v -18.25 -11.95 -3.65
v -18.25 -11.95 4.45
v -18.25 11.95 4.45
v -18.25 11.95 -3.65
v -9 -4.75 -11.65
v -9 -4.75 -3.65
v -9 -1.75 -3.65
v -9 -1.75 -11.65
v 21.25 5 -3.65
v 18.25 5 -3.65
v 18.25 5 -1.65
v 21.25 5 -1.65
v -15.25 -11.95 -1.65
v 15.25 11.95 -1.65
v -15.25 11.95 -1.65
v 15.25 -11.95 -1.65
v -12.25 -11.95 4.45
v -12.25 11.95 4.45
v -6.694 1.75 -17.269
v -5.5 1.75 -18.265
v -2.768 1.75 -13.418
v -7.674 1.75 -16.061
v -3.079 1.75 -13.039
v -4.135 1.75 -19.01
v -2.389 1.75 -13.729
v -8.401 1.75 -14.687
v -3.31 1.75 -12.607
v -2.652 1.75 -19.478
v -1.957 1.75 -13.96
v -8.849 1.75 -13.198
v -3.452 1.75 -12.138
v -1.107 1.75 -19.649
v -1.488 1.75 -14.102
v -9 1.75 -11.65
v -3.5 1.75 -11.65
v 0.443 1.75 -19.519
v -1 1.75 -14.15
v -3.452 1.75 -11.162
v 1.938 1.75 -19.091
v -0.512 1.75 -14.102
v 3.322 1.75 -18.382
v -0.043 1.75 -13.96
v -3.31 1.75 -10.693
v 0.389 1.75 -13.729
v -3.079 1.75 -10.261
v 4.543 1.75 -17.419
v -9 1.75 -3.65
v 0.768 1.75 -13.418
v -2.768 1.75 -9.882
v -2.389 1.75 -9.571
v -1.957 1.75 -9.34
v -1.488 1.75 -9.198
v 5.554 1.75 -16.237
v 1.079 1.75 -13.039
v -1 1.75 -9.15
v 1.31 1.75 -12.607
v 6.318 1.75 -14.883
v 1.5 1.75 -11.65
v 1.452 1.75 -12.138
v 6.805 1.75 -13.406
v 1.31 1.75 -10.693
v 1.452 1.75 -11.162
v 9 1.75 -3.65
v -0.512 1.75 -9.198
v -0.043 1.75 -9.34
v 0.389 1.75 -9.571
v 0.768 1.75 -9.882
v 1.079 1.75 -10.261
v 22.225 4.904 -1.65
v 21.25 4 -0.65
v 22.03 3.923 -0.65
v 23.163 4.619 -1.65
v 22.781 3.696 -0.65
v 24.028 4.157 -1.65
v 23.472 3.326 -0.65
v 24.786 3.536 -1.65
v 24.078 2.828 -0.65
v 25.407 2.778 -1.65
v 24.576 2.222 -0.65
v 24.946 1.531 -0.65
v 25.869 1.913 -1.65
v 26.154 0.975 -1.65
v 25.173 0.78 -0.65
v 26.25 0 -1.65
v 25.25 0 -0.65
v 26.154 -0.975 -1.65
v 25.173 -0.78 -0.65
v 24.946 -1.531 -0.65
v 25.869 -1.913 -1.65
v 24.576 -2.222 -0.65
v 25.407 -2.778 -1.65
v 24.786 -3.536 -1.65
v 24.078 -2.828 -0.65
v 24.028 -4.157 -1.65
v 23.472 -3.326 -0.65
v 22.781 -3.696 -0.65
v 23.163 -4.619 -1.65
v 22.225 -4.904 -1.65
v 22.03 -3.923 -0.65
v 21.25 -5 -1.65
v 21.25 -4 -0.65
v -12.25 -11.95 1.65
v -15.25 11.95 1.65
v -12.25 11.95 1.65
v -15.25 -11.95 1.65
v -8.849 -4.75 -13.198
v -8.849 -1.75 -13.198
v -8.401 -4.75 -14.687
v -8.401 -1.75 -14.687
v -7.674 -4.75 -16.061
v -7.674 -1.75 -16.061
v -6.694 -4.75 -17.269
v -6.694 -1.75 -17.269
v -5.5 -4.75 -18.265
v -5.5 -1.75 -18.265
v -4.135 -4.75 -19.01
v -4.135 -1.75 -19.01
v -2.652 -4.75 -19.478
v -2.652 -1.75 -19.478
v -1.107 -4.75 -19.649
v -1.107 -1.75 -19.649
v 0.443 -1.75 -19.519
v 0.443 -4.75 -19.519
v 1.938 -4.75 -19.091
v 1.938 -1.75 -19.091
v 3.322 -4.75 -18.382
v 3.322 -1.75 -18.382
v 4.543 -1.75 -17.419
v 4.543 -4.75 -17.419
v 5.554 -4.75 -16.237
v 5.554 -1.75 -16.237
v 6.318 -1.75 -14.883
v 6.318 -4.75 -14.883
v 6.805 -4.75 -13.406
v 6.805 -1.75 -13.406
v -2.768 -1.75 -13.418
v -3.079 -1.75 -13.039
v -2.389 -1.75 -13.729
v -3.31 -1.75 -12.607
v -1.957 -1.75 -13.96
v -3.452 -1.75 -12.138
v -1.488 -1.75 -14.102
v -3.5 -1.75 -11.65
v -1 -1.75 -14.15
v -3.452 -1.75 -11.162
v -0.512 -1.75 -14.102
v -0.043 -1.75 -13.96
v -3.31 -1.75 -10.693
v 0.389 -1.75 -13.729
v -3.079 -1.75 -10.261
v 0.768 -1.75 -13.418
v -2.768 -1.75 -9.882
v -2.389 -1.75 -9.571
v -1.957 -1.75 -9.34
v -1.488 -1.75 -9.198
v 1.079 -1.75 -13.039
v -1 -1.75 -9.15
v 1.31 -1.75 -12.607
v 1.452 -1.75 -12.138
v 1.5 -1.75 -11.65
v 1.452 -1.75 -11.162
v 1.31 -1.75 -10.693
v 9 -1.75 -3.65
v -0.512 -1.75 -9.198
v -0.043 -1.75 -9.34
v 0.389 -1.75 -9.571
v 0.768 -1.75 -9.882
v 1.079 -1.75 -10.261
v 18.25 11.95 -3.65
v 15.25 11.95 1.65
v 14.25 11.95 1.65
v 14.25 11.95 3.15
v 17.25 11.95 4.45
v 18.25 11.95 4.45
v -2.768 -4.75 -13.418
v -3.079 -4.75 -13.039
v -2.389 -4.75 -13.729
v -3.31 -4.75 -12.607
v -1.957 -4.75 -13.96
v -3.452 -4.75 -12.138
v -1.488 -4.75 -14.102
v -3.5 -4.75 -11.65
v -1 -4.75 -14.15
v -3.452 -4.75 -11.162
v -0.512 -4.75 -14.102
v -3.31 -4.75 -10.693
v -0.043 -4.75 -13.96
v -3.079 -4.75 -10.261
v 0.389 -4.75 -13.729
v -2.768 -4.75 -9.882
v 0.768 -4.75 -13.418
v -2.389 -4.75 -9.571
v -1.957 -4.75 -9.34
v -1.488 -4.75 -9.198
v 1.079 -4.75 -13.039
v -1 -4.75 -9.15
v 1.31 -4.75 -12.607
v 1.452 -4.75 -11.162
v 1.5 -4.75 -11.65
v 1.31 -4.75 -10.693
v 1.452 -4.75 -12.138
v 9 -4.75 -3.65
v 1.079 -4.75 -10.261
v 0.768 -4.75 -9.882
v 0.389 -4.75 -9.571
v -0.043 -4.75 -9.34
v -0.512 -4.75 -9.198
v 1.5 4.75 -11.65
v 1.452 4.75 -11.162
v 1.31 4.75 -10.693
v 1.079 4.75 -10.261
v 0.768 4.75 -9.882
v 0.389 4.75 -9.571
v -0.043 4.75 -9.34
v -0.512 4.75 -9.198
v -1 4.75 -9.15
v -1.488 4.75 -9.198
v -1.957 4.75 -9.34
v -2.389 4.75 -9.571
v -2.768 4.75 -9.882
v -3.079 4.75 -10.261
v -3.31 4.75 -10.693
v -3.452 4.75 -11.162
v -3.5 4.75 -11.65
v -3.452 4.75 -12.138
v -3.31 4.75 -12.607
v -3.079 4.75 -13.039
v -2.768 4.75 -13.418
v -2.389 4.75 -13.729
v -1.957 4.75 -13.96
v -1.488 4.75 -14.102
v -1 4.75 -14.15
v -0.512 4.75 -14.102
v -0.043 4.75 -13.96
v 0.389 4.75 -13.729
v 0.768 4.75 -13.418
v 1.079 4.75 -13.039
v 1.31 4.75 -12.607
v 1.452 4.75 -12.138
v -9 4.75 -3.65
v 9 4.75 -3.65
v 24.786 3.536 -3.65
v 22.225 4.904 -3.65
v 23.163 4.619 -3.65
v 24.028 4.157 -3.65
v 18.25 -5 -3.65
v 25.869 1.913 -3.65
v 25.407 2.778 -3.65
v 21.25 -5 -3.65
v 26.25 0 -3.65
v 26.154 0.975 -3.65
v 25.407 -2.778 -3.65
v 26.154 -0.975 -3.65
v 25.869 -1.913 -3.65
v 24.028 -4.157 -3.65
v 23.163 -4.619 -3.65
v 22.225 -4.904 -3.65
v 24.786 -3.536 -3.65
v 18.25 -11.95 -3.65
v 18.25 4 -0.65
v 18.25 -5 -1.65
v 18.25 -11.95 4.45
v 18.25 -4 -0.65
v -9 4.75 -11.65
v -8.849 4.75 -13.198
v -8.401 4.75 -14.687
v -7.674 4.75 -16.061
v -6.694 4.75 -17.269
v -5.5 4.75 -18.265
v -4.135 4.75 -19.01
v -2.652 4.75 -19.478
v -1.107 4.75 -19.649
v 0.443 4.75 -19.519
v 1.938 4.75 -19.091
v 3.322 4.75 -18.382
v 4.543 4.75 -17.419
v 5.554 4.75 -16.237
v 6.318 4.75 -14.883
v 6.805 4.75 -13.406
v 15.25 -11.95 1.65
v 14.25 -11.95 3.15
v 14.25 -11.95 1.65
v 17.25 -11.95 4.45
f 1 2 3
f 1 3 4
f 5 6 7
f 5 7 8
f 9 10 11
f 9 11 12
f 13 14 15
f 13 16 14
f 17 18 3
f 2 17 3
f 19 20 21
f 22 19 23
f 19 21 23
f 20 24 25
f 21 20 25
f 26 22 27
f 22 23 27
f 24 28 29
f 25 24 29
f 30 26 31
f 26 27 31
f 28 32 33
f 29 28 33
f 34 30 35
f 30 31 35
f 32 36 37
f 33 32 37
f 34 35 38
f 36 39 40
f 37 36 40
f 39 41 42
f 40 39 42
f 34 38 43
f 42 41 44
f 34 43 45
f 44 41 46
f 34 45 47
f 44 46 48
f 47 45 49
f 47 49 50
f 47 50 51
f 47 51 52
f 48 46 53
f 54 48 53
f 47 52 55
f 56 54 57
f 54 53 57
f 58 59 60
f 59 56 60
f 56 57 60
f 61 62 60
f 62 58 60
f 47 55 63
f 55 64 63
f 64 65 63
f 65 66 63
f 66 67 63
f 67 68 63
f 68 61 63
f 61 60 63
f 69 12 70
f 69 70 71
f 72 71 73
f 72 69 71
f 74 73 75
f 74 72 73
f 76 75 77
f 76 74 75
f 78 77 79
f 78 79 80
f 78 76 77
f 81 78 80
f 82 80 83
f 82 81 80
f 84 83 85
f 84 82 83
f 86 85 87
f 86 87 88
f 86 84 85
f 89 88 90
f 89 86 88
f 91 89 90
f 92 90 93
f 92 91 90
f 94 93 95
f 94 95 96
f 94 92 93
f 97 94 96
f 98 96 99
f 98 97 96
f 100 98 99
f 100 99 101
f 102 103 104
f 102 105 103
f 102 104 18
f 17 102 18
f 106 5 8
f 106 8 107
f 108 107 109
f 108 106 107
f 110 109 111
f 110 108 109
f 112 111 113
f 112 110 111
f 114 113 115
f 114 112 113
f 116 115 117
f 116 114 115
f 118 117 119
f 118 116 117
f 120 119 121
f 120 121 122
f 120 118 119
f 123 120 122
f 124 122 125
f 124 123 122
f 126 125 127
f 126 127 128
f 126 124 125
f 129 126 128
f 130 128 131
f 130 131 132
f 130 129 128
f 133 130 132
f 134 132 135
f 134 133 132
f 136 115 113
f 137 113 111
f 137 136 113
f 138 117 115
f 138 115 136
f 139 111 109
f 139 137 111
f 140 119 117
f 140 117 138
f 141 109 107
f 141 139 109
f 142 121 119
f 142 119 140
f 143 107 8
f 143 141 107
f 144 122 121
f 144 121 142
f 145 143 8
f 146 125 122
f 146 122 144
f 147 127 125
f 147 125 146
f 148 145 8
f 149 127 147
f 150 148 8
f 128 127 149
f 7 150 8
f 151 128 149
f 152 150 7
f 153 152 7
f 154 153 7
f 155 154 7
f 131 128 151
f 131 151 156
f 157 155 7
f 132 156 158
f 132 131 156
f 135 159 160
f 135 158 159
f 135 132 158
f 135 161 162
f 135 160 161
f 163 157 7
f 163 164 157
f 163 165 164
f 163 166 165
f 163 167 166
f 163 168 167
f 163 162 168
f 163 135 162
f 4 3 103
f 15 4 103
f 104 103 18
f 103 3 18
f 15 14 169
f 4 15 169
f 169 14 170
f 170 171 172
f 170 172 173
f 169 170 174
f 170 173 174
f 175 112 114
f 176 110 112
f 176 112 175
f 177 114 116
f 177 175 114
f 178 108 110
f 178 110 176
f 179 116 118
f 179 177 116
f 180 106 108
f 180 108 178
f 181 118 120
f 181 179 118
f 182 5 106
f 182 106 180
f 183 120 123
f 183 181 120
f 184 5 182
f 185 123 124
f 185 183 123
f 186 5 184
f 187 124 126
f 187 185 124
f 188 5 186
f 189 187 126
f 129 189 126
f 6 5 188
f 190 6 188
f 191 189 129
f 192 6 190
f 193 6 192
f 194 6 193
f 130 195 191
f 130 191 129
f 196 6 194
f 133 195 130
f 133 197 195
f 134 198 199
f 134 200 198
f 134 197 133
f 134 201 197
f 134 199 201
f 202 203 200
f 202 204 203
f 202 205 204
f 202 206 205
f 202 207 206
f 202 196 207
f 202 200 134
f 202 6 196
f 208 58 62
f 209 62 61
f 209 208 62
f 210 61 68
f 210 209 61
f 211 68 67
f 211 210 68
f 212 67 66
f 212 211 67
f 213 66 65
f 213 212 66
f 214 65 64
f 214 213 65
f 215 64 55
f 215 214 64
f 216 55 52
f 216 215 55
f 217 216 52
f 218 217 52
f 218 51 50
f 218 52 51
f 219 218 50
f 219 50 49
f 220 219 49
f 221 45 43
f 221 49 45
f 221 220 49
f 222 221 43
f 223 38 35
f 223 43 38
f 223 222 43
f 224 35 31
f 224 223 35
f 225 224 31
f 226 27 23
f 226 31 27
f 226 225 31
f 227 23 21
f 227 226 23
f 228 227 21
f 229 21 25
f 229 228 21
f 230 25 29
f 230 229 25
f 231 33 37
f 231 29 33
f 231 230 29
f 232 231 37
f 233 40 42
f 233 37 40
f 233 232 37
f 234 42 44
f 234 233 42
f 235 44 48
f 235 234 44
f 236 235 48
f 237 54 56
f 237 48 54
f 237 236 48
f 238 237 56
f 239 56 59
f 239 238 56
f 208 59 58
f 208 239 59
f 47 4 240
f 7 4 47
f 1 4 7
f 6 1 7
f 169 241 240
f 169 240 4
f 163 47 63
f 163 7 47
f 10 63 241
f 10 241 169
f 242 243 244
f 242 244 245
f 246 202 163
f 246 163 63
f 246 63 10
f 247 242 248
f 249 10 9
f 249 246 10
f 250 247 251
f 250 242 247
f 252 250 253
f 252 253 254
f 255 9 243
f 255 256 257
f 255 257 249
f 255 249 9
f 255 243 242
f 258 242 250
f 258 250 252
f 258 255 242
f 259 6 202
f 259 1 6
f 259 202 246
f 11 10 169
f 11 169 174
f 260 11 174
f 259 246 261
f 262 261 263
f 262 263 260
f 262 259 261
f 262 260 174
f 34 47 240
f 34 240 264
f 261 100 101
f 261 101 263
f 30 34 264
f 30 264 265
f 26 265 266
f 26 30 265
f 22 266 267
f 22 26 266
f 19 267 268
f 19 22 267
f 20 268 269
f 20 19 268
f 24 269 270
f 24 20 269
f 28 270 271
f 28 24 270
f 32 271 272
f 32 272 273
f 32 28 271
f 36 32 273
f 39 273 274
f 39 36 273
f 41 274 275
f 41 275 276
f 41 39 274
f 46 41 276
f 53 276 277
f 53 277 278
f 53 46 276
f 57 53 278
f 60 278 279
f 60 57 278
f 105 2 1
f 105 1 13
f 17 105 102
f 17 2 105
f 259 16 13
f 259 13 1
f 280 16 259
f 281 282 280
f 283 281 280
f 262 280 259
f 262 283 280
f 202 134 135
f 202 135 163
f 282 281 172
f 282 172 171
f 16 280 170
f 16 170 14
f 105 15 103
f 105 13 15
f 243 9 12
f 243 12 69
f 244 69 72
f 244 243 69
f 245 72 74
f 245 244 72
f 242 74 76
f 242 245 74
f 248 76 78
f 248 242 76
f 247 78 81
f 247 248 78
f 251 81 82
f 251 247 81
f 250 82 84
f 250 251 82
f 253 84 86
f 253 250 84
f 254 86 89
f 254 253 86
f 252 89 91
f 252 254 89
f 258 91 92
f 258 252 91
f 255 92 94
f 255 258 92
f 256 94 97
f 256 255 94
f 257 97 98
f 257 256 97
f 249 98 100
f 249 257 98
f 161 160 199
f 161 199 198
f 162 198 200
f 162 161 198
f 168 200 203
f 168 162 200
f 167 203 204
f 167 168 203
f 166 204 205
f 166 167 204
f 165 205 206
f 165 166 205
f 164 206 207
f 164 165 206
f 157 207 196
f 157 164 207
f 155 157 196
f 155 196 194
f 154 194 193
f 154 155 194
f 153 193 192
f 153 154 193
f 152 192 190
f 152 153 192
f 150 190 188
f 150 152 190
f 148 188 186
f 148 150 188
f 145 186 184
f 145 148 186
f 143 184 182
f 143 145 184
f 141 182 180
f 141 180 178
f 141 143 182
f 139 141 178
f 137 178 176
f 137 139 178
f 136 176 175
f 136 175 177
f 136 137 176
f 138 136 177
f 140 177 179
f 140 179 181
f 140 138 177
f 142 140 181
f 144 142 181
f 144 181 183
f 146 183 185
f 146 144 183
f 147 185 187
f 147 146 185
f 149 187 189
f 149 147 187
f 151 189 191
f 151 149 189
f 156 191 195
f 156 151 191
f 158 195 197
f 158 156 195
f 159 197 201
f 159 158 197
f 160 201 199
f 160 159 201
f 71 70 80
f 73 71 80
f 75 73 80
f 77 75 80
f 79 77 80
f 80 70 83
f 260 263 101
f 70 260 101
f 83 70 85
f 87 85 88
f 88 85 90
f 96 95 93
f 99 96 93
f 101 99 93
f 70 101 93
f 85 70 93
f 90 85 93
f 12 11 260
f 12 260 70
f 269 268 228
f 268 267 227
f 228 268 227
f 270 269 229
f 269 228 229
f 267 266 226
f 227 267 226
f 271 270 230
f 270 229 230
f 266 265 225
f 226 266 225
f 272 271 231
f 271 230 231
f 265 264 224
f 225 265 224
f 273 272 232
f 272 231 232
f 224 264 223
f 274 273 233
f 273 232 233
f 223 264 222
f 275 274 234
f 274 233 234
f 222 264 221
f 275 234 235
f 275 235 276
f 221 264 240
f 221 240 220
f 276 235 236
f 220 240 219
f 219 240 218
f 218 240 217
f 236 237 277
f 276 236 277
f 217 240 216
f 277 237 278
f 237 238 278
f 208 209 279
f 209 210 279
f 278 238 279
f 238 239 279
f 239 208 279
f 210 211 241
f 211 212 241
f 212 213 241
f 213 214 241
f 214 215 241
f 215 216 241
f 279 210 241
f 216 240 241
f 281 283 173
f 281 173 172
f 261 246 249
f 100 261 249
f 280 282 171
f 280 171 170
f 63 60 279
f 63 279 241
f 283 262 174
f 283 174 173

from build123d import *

# Parameters (mm, degrees)
F1_DEPTH = 11.95
F2_R     = 2.5
F3_DEPTH = 4.75
F4_W     = 3.5
F4_H     = 22
F5_DEPTH = 12.5
F6_W     = 3
F6_H     = 10
F7_DEPTH = 3
F8_SIZE  = 1


with BuildPart() as f1:
    # F0 (on Front) → F1 (new body, symmetric)
    with BuildSketch(Plane.XZ):
        Polygon((-15.25, 1.65), (-12.25, 1.65), (-12.25, 4.45), (-18.25, 4.45), (-18.25, -3.65), (18.25, -3.65), (18.25, 4.45), (17.25, 4.45), (14.25, 3.15), (14.25, 1.65), (15.25, 1.65), (15.25, -1.65), (-15.25, -1.65), align=None)
    extrude(amount=F1_DEPTH, both=True)

    # F2 (on Front) → F3 (join, symmetric)
    with BuildSketch(Plane.XZ):
        with BuildLine():
            Line((-9, -3.65), (-9, -11.65))
            ThreePointArc((-9, -11.65), (-1.883452, -19.60107), (6.804878, -13.406098))
            Line((6.804878, -13.406098), (9, -3.65))
            Line((9, -3.65), (-9, -3.65))
        make_face()
        with Locations((-1, -11.65)):
            Circle(F2_R, mode=Mode.SUBTRACT)
    extrude(amount=F3_DEPTH, both=True)

    # F4 (on Right) → F5 (cut, symmetric)
    with BuildSketch(Plane.YZ):
        with Locations((0, -14.65)):
            Rectangle(F4_W, F4_H)
    extrude(amount=F5_DEPTH, both=True, mode=Mode.SUBTRACT)

    # F6 (on face) → F7 (join)
    with BuildSketch(Plane(origin=(0, 0, -3.65), x_dir=(1, 0, 0), z_dir=(0, 0, -1))):
        with Locations((19.75, 0)):
            Rectangle(F6_W, F6_H)
        with BuildLine():
            Line((21.25, 5), (21.25, -5))
            ThreePointArc((21.25, -5), (26.25, 0), (21.25, 5))
        make_face()
    extrude(amount=-F7_DEPTH)

    # F8
    f8_edges = [f1.edges().sort_by_distance(p)[0] for p in [
        (26.25, 0, -0.65),
    ]]
    chamfer(f8_edges, length=F8_SIZE)


solid = f1.part
